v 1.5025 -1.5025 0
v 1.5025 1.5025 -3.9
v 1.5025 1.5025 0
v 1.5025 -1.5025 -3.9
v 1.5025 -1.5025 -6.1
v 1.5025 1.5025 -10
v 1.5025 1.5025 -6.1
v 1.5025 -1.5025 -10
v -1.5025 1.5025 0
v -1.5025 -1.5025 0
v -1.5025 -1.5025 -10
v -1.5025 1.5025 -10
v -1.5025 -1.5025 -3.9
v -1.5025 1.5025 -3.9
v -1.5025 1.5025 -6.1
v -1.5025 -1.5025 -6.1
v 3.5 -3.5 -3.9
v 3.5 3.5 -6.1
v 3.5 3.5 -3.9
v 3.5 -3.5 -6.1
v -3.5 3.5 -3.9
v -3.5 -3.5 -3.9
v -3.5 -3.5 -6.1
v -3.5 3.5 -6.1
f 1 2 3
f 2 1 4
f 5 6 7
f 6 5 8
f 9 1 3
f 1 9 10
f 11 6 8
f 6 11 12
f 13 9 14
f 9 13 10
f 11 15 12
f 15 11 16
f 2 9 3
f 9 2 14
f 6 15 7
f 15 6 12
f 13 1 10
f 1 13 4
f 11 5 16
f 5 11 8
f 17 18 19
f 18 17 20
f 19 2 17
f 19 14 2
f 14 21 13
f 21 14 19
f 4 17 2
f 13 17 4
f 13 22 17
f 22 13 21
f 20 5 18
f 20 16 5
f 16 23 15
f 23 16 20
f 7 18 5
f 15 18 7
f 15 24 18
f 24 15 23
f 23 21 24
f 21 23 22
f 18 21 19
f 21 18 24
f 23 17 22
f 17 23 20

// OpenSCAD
// file: measures.scad
/*
 * All measures of the model
 * Default units: Millimeters
 */

// rendering parameters
$fn = 50;

// material to cut from
material_x = 430;
material_y = 270;
material_z = 3;

// house cuboid
house_x = 150;
house_y = 110;
house_z = 60;

// distances from left and bottom house edges
door_x = 35;
door_z = 35;
door_radius = 35/2;

window_z = 12;

// how many holes per edge
strap_hole_count = 1;
strap_hole_radius = 3;
strap_hole_spacing = house_y/(strap_hole_count+1);
strap_hole_to_edge = 7;

// angle between upper house cuboid edge and roof plane in degrees
roof_angle = 30;

// elevation inside roof corner above upper edge of house cuboid
roof_elevation = tan(roof_angle) * house_x/2;

// length of a roof plane from top corner to house cuboid corner
roof_hypothenuse = 1/cos(roof_angle) * house_x/2;

// make roof a little longer than required
roof_plane_x = roof_hypothenuse * 1.2;
roof_plane_y = house_y * 1.2;

/*
// M4
screw_radius = 4;
screw_length = 20;
washer_radius = 9;
nut_height = 3.2;
nut_wrench_size = 7;
nut_offset = 7;
*/

// M3
screw_radius = 3.005;
screw_length = 10;
washer_radius = 7;
nut_height = 2.2;
nut_wrench_size = 7;
nut_offset = 5;
// main file
include <measures.scad>;

/*
 * Positive model of a cavity
 * required for pressing in a nut
 * and screwing in a screw
 */
module screw_cavity()
{
    // cavity for the screw thread
    translate([
        0,
        0,
        -screw_length/2
        ])
    cube([
        screw_radius,
        screw_radius,
        screw_length
        ], center=true);

    // cavity for the nut
    translate([
        0,
        0,
        -nut_offset
        ])
    cube([
        nut_wrench_size,
        nut_wrench_size,
        nut_height
        ], center=true);
}

screw_cavity();
